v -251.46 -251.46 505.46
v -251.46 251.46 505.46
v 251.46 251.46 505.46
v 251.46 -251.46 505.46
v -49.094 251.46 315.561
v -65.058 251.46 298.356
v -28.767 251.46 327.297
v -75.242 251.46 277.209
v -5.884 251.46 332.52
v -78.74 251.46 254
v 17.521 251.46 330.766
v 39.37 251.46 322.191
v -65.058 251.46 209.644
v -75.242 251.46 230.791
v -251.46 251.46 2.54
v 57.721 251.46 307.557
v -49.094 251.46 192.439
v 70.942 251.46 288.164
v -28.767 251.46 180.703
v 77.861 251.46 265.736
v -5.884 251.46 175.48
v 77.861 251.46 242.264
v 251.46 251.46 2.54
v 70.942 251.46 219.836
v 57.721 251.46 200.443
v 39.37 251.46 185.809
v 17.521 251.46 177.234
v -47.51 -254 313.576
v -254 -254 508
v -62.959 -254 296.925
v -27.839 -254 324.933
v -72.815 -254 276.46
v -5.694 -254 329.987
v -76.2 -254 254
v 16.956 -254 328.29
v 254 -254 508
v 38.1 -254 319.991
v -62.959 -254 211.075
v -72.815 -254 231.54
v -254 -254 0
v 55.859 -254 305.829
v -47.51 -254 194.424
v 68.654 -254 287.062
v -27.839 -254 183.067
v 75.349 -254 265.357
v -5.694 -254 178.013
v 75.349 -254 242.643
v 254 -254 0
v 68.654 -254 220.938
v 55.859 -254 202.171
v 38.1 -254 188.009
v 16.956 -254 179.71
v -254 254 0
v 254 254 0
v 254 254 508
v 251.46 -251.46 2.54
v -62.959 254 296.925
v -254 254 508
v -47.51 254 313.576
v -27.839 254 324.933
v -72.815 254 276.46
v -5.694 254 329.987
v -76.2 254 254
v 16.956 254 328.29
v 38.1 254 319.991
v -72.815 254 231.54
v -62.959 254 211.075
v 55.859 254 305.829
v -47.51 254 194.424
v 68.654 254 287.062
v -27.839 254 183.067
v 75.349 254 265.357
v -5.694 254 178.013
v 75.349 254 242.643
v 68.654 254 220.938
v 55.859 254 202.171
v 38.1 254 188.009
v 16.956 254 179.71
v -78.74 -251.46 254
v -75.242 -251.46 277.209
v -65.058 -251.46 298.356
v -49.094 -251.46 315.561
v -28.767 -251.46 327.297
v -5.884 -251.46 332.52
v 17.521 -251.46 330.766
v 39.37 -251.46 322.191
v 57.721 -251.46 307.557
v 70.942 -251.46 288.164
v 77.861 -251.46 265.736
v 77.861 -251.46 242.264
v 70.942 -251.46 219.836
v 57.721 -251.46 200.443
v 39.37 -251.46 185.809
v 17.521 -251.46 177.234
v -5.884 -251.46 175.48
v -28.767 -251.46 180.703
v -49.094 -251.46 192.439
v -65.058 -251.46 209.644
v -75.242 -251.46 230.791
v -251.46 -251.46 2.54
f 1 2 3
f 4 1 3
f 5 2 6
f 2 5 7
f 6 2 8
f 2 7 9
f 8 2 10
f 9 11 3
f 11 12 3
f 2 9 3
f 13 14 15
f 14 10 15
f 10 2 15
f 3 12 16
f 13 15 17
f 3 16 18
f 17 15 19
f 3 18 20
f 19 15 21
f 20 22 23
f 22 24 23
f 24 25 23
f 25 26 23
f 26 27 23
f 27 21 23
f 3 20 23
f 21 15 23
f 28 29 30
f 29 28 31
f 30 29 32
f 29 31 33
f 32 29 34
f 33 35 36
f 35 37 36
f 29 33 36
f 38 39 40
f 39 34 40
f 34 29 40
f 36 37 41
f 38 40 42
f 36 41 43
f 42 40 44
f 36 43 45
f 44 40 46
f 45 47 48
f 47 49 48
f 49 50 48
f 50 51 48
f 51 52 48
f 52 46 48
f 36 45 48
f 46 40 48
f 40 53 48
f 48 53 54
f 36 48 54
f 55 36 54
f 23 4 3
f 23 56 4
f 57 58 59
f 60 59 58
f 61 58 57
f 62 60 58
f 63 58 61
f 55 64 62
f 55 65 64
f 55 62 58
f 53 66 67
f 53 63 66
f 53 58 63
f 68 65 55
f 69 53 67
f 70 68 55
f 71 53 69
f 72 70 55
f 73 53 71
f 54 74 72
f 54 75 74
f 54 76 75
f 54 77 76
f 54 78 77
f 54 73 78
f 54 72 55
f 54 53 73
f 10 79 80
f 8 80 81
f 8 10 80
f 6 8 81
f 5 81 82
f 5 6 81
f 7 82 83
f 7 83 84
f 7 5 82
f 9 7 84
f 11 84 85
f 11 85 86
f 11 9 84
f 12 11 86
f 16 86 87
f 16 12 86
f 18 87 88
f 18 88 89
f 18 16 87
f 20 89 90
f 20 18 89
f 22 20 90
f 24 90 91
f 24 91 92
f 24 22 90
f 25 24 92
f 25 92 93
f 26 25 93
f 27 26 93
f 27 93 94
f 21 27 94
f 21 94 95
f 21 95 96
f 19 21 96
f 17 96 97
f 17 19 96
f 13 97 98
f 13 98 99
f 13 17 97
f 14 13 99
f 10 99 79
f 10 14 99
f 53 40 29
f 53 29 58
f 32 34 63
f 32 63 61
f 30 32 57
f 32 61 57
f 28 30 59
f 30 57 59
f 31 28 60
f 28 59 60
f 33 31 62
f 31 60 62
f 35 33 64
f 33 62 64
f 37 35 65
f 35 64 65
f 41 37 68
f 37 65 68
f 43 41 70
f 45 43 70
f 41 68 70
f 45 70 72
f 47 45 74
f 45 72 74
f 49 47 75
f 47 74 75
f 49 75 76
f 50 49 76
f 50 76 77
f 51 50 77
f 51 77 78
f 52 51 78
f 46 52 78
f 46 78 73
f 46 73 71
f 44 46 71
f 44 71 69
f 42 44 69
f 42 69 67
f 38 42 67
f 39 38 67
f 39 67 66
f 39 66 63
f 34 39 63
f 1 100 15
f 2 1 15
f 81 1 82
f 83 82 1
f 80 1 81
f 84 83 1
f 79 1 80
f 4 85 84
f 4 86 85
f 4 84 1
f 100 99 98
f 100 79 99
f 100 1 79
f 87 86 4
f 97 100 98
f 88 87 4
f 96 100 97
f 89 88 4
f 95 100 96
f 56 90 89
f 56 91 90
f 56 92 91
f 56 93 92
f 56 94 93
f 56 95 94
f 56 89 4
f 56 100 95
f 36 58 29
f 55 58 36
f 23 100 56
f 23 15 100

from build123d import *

# Parameters (mm, degrees)
F0_W     = 508
F0_H     = 508
F1_DEPTH = 508
F3_D     = 152.4
F4_T     = -2.54


with BuildPart() as f1:
    # F0 (on Top) → F1 (new body)
    with BuildSketch(Plane.XY):
        Rectangle(F0_W, F0_H)
    extrude(amount=F1_DEPTH)

    # F3 (through all)
    with Locations(Plane.XZ.offset(254)):
        with Locations((0, 254)):
            Hole(F3_D / 2)

    # F4 (hollow: no face is removed)
    offset(amount=F4_T, mode=Mode.SUBTRACT)


solid = f1.part
